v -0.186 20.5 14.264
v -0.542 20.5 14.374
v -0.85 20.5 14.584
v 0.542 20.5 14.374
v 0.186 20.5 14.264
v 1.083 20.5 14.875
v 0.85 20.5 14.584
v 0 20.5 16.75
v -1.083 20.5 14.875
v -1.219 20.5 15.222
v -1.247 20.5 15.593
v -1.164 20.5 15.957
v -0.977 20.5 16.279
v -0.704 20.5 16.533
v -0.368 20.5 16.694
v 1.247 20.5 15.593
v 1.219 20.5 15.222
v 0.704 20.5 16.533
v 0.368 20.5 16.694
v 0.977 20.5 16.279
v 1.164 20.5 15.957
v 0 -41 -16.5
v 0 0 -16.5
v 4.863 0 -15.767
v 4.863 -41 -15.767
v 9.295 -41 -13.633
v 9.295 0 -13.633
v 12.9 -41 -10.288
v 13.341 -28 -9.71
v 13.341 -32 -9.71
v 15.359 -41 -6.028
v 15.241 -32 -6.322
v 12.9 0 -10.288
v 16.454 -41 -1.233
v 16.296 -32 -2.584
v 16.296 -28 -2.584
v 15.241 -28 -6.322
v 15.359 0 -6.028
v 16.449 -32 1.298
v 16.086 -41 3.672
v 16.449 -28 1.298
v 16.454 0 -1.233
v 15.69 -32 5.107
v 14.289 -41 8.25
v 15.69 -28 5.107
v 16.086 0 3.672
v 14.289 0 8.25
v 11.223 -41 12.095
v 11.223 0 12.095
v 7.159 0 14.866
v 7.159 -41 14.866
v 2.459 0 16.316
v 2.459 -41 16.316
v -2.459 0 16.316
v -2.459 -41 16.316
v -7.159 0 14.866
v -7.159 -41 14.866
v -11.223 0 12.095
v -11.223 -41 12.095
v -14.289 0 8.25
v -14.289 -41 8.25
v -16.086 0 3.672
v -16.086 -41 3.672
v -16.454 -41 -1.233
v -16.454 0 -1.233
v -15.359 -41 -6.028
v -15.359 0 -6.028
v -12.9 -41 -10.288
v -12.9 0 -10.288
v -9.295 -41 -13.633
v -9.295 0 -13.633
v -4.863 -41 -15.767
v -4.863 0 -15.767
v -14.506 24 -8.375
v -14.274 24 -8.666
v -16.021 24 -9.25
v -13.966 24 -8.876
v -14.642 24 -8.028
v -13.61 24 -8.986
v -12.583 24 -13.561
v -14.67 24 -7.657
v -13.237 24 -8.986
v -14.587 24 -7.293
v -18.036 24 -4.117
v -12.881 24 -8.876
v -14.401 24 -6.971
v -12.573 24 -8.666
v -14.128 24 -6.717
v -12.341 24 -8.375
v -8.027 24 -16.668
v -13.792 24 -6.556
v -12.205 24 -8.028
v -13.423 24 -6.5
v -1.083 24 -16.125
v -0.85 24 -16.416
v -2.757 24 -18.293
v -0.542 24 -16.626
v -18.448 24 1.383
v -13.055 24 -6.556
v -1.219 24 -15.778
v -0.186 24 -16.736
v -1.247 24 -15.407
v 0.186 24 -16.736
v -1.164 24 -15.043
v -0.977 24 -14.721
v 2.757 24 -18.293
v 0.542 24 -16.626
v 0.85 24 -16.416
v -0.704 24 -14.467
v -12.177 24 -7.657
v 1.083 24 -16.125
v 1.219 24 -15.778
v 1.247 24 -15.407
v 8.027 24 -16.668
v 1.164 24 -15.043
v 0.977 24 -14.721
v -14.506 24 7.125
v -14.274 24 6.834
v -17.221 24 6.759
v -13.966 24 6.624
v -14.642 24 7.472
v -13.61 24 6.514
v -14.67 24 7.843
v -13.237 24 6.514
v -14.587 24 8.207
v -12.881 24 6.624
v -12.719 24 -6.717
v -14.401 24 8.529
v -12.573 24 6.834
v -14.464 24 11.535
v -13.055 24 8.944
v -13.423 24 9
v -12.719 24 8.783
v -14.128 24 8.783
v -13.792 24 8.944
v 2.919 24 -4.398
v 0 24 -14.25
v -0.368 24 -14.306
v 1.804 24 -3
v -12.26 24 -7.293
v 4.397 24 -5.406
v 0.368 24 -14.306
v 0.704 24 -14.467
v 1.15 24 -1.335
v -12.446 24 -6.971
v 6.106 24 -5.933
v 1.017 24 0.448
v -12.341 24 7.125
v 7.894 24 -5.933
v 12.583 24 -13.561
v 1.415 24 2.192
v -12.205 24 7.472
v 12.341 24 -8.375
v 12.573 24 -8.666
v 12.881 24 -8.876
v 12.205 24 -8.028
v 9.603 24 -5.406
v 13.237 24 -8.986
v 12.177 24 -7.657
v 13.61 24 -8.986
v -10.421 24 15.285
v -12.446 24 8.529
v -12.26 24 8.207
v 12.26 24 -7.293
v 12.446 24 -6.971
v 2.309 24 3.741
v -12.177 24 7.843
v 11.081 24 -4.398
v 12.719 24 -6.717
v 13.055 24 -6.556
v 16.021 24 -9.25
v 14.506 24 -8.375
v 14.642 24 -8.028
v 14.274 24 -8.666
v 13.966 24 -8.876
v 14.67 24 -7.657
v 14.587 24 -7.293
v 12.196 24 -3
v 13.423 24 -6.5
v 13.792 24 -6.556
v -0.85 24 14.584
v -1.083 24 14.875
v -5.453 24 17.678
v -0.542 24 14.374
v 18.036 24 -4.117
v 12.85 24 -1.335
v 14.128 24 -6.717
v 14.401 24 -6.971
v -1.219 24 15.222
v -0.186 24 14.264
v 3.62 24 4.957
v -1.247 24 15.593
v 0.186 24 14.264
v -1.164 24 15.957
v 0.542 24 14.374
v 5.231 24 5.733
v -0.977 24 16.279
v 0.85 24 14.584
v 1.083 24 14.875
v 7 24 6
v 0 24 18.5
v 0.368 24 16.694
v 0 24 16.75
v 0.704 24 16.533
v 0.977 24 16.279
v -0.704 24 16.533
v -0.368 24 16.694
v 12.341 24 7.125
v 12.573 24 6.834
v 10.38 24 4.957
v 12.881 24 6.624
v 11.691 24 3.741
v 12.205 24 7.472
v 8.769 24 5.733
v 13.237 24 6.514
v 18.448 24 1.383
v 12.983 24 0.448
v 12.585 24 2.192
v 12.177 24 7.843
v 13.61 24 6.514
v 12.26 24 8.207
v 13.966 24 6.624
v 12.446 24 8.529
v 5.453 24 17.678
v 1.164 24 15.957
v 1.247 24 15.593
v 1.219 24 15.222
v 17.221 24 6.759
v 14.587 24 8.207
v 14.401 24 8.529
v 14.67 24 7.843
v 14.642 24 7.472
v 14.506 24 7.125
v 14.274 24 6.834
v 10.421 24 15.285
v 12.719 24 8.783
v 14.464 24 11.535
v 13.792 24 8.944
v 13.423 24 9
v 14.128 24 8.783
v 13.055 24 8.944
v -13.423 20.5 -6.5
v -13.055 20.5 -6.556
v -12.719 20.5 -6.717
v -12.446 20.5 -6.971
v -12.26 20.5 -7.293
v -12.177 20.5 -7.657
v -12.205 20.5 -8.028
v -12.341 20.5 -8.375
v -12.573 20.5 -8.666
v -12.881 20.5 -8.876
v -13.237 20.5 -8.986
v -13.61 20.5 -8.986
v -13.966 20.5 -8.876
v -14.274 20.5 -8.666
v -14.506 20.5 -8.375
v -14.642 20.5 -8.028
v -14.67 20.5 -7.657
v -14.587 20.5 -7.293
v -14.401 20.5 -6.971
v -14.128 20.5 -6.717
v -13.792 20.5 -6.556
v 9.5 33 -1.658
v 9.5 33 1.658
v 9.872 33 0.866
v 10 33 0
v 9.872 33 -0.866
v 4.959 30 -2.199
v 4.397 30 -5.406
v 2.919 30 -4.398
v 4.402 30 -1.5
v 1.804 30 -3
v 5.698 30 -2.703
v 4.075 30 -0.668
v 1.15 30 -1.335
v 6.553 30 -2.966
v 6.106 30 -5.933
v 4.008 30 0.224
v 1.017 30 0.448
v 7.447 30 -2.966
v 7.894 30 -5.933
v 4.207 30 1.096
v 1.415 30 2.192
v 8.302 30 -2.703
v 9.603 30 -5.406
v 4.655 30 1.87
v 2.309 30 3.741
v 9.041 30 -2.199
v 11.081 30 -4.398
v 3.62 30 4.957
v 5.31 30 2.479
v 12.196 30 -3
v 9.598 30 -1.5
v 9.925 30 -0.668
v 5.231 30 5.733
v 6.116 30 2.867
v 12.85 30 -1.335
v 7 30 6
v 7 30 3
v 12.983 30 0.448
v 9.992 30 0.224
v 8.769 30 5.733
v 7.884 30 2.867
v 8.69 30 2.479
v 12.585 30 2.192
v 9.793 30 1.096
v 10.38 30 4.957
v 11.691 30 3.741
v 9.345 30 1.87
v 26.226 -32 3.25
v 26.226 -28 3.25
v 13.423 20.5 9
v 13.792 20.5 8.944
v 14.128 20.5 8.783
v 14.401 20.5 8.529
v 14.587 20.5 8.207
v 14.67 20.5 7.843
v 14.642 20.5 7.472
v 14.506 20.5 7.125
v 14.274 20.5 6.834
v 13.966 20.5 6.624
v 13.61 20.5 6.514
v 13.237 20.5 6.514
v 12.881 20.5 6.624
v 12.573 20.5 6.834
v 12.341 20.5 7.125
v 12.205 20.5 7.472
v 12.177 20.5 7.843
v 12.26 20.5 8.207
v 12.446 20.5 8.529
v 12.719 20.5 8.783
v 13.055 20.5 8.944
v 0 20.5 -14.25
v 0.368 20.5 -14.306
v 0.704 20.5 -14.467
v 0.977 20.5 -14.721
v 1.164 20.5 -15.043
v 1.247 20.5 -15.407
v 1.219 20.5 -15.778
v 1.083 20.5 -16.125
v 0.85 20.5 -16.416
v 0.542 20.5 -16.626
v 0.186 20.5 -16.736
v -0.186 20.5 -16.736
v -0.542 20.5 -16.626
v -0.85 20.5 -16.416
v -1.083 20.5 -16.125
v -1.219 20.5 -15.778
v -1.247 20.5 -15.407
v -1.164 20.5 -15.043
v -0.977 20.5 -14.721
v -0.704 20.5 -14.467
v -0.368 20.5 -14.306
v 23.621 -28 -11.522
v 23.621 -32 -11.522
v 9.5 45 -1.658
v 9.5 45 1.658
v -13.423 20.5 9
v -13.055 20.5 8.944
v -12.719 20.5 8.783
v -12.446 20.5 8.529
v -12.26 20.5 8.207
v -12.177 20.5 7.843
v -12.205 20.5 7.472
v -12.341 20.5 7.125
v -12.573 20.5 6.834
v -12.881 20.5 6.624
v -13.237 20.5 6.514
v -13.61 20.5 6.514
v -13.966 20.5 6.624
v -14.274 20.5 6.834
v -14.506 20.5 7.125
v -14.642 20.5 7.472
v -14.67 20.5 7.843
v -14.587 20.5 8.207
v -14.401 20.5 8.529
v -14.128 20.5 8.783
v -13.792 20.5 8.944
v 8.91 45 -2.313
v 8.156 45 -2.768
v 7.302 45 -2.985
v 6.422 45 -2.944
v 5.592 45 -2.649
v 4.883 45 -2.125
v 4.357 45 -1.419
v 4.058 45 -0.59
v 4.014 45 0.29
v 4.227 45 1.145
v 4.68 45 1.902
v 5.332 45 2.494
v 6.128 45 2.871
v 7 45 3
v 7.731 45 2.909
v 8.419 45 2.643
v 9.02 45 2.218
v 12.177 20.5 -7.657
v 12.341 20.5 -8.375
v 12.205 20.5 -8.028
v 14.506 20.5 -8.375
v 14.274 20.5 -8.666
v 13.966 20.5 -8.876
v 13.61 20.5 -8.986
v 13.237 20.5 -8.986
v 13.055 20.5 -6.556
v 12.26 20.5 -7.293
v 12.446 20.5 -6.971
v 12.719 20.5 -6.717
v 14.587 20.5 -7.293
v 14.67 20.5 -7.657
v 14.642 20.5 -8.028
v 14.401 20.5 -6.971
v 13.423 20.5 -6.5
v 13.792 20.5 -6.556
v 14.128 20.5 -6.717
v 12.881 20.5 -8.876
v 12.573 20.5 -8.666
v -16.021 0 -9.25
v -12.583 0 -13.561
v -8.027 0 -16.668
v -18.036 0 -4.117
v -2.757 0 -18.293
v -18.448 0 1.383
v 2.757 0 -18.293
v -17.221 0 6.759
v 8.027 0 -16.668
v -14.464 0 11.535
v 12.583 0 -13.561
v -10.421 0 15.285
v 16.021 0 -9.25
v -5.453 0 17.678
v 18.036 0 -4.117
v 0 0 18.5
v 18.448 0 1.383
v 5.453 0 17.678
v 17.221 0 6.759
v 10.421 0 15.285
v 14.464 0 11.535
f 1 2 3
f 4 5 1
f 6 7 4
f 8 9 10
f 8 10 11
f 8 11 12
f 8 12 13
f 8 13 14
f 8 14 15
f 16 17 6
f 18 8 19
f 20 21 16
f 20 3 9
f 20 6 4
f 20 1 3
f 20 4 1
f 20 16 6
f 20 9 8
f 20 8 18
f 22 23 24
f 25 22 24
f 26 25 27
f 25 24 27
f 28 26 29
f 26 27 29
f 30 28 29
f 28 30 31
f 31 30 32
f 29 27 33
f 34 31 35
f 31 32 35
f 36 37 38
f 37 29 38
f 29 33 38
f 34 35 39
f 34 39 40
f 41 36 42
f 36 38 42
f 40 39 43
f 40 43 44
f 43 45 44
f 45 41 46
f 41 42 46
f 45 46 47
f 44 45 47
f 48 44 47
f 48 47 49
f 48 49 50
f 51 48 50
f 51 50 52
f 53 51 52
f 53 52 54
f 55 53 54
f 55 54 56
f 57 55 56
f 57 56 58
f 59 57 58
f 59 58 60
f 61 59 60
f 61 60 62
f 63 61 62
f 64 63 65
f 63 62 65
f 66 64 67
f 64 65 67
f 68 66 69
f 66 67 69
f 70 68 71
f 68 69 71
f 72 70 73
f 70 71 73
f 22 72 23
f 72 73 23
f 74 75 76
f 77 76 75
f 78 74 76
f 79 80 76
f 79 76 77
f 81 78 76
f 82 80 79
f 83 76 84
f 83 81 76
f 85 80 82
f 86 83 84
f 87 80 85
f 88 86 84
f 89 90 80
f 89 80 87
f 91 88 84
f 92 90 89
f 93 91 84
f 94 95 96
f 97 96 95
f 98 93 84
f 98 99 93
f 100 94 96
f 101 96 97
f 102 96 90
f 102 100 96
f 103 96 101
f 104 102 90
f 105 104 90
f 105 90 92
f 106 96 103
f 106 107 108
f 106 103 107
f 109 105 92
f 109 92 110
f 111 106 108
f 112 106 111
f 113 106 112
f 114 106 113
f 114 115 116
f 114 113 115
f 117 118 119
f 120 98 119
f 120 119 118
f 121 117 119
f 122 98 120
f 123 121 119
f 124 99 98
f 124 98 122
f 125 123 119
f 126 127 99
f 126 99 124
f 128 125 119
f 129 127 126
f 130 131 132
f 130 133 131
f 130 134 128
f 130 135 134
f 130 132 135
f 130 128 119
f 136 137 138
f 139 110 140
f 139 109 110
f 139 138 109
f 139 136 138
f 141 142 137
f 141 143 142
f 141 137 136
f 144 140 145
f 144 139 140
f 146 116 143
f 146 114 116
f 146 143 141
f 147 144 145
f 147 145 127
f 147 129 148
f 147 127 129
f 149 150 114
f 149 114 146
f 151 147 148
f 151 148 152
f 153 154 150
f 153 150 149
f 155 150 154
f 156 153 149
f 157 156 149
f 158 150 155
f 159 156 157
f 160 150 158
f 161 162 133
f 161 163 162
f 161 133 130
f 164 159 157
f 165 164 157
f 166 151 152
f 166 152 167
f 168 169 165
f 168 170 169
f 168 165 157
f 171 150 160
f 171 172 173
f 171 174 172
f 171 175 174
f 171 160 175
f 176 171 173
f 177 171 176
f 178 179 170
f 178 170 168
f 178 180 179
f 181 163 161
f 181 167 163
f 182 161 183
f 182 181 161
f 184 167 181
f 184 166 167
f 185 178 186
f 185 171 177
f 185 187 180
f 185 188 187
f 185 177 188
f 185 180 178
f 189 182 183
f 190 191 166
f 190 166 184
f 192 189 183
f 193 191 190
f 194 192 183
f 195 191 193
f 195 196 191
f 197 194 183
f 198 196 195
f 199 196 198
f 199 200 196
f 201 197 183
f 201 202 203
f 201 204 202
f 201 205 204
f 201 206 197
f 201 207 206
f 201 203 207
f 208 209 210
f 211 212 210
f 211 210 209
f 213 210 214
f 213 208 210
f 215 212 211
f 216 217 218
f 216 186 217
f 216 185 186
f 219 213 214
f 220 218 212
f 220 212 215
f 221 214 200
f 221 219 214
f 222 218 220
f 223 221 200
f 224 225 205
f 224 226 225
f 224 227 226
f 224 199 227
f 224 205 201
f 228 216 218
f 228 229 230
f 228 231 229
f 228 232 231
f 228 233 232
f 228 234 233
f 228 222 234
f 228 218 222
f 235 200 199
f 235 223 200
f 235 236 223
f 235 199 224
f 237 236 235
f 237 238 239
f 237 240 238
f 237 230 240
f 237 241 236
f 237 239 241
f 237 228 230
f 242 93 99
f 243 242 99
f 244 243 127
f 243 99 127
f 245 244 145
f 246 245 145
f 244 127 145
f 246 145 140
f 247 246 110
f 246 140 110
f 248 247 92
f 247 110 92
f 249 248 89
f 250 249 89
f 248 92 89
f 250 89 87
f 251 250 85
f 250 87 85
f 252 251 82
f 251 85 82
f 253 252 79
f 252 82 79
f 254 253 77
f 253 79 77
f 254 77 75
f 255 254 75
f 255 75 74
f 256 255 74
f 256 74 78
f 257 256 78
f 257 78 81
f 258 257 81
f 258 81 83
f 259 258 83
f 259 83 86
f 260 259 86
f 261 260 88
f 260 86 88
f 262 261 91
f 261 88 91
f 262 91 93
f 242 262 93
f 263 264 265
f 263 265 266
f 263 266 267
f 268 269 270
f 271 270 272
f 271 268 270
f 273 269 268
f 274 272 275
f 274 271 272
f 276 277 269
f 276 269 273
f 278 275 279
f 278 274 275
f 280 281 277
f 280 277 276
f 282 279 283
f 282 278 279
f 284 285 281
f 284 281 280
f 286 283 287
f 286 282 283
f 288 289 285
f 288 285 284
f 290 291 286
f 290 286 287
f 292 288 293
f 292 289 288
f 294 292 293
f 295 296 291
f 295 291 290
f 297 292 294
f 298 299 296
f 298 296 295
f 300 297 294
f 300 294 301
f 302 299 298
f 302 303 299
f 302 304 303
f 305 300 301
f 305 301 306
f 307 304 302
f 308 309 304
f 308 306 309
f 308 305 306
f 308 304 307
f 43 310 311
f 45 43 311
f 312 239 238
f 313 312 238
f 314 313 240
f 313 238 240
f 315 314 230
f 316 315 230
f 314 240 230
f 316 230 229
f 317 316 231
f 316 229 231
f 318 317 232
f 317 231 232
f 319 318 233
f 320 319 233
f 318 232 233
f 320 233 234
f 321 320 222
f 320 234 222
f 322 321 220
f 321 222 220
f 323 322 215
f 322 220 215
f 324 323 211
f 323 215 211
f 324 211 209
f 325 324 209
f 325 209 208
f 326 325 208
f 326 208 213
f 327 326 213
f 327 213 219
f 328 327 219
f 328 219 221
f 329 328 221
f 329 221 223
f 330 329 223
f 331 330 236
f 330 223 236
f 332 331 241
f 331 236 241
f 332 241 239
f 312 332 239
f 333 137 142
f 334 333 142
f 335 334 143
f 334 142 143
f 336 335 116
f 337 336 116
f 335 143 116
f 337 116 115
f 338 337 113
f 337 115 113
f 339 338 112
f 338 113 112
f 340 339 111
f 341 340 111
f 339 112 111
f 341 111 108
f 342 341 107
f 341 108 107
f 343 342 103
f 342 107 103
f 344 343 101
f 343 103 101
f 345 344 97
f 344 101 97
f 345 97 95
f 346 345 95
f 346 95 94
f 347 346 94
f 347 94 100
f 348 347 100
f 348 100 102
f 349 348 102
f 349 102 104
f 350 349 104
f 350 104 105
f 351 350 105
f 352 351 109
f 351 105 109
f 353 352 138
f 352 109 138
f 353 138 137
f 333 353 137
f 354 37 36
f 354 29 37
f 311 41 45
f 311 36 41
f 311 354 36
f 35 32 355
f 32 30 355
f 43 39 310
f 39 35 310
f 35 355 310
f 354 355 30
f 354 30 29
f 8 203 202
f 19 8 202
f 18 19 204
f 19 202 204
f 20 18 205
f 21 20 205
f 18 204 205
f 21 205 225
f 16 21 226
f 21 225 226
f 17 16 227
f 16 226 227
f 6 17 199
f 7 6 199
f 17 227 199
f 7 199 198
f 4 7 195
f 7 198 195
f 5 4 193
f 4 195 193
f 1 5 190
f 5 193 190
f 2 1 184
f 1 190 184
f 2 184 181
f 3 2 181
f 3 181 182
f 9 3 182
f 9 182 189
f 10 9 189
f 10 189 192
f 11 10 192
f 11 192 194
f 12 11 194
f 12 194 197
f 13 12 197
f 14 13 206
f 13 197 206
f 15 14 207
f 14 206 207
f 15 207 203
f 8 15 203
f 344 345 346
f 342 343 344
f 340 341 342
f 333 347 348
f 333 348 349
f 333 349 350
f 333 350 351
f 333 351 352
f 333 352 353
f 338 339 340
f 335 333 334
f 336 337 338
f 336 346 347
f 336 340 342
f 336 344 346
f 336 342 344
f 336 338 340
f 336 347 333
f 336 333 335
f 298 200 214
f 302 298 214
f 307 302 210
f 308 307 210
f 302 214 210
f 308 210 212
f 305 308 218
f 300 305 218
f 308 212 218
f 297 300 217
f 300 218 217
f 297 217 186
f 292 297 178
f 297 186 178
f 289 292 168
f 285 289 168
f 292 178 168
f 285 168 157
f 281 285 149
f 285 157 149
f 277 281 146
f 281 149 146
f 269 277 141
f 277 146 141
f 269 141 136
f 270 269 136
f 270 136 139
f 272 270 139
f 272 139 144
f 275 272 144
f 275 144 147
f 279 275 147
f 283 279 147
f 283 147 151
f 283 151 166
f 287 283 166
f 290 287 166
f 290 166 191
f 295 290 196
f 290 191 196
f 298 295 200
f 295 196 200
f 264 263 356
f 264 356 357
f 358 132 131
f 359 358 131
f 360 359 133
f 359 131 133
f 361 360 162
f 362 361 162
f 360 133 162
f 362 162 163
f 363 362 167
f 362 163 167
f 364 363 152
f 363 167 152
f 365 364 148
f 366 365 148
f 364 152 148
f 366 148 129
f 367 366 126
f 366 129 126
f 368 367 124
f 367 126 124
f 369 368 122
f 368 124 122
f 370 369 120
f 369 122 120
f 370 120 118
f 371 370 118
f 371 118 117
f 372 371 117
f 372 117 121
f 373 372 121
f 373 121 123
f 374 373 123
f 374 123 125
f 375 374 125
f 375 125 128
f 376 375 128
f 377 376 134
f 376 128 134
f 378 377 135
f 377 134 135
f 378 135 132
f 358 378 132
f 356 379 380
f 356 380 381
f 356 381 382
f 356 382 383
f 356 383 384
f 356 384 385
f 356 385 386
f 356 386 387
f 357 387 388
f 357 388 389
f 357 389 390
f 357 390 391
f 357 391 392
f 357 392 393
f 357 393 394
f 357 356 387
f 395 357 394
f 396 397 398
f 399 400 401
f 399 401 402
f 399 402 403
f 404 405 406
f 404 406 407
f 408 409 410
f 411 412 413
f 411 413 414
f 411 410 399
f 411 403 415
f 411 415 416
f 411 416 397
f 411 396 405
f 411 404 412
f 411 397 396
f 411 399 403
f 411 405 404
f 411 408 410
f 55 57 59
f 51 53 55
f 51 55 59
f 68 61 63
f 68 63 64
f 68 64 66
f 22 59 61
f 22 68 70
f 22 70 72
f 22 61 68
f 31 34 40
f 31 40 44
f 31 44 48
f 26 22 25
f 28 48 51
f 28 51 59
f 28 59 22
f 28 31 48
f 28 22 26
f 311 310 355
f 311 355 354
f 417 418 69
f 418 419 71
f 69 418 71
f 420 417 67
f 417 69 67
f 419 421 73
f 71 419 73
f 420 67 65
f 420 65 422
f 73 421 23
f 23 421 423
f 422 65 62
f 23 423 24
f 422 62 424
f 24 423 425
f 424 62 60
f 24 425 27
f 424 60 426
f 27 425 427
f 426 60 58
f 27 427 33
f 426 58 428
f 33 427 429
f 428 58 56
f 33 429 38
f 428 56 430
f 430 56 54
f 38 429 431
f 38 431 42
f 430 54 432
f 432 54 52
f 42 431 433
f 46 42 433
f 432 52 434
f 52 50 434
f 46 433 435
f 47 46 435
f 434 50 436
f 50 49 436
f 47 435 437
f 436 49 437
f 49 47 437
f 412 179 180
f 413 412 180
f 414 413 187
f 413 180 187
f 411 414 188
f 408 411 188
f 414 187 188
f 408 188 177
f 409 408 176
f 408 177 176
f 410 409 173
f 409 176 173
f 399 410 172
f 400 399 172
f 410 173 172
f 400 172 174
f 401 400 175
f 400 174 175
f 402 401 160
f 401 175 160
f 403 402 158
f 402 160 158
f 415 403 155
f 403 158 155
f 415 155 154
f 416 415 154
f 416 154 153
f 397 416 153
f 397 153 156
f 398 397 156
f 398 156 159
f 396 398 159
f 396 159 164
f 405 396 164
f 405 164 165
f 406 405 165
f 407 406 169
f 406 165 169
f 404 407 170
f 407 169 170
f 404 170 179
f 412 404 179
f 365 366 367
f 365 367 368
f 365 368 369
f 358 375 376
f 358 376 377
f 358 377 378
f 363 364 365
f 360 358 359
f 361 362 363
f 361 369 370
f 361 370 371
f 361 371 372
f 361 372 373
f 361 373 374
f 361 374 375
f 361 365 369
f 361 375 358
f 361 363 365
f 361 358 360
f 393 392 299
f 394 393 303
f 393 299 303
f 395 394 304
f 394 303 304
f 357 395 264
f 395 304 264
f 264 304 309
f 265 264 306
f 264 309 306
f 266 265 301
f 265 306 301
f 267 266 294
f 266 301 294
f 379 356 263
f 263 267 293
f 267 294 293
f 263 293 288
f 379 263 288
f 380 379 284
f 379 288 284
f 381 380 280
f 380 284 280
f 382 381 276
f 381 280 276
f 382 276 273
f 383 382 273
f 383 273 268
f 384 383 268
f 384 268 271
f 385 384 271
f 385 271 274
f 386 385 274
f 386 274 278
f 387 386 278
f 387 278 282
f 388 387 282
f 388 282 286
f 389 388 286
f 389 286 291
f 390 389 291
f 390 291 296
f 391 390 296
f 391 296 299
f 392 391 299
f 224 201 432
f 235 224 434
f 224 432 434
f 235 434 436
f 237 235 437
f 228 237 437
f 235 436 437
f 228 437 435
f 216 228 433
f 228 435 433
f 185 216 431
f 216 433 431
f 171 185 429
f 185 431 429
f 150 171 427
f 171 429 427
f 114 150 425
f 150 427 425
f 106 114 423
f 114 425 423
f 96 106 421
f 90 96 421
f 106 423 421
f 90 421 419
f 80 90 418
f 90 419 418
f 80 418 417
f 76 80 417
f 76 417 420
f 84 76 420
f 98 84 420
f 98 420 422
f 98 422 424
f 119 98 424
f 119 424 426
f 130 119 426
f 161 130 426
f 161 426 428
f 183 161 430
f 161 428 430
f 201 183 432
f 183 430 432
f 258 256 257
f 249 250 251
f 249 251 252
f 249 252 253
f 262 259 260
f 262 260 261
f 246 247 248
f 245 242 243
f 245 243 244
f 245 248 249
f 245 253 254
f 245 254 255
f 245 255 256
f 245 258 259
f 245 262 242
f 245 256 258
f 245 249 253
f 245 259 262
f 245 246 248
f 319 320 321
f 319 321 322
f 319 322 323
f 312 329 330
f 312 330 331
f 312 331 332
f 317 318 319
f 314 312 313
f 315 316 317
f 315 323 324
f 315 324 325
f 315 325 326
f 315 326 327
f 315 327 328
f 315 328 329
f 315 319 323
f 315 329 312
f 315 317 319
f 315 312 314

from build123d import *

# Parameters (mm, degrees)
SKETCH1_R           = 18.5
BOSS_EXTRUDE1_DEPTH = 24
SKETCH2_R           = 16.5
BOSS_EXTRUDE2_DEPTH = 41
SKETCH6_R           = 1.25
CUT_EXTRUDE1_DEPTH  = 3.5
SKETCH7_R           = 6
BOSS_EXTRUDE5_DEPTH = 6
SKETCH8_R           = 3
BOSS_EXTRUDE6_DEPTH = 15
CUT_EXTRUDE2_START  = -12
CUT_EXTRUDE2_DEPTH  = 12
SKETCH3_W           = 4
SKETCH3_H           = 15
BOSS_EXTRUDE4_DEPTH = 8.763


with BuildPart() as part:
    # Sketch1 → Boss-Extrude1 (new body)
    with BuildSketch(Plane(origin=(0, 0, 0), x_dir=(1, 0, 0), z_dir=(0, 1, 0))):
        with Locations(Location((0, 0, 0), (0, 0, 270))):
            Circle(SKETCH1_R)
    extrude(amount=BOSS_EXTRUDE1_DEPTH)

    # Sketch2 → Boss-Extrude2 (add)
    with BuildSketch(Plane.XZ):
        with Locations(Location((0, 0, 0), (0, 0, 270))):
            Circle(SKETCH2_R)
    extrude(amount=BOSS_EXTRUDE2_DEPTH)

    # Sketch6 → Cut-Extrude1 (cut)
    with BuildSketch(Plane(origin=(0, 24, 0), x_dir=(1, 0, 0), z_dir=(0, 1, 0))):
        with Locations(Location((13.423393759, 7.75, 0), (0, 0, 270))):
            Circle(SKETCH6_R)
        with Locations(Location((0, 15.5, 0), (0, 0, 270))):
            Circle(SKETCH6_R)
        with Locations(Location((13.423393759, -7.75, 0), (0, 0, 270))):
            Circle(SKETCH6_R)
        with Locations(Location((0, -15.5, 0), (0, 0, 270))):
            Circle(SKETCH6_R)
        with Locations(Location((-13.423393759, -7.75, 0), (0, 0, 270))):
            Circle(SKETCH6_R)
        with Locations(Location((-13.423393759, 7.75, 0), (0, 0, 270))):
            Circle(SKETCH6_R)
    extrude(amount=-CUT_EXTRUDE1_DEPTH, mode=Mode.SUBTRACT)

    # Sketch7 → Boss-Extrude5 (add)
    with BuildSketch(Plane(origin=(0, 24, 0), x_dir=(1, 0, 0), z_dir=(0, 1, 0))):
        with Locations(Location((7, 0, 0), (0, 0, 270))):
            Circle(SKETCH7_R)
    extrude(amount=BOSS_EXTRUDE5_DEPTH)

    # Sketch8 → Boss-Extrude6 (add)
    with BuildSketch(Plane(origin=(0, 30, 0), x_dir=(1, 0, 0), z_dir=(0, 1, 0))):
        with Locations(Location((7, 0, 0), (0, 0, 270))):
            Circle(SKETCH8_R)
    extrude(amount=BOSS_EXTRUDE6_DEPTH)

    # Sketch9 → Cut-Extrude2 (cut)
    with BuildSketch(Plane(origin=(0, 45, 0), x_dir=(1, 0, 0), z_dir=(0, 1, 0)).offset(CUT_EXTRUDE2_START)):
        with BuildLine():
            Line((9.5, 1.658312395), (9.5, -1.658312395))
            ThreePointArc((9.5, -1.658312395), (10, 0), (9.5, 1.658312395))
        make_face()
    extrude(amount=CUT_EXTRUDE2_DEPTH, mode=Mode.SUBTRACT)

    # Sketch3 → Boss-Extrude4 (add, symmetric)
    with BuildSketch(Plane(origin=(16.249327925, 0, -2.865194932), x_dir=(0, 1, 0), z_dir=(0.984807753012208, 0, -0.17364817766693072))):
        with Locations((-30, 0.254363191)):
            Rectangle(SKETCH3_W, SKETCH3_H)
    extrude(amount=BOSS_EXTRUDE4_DEPTH, both=True)


solid = part.part
